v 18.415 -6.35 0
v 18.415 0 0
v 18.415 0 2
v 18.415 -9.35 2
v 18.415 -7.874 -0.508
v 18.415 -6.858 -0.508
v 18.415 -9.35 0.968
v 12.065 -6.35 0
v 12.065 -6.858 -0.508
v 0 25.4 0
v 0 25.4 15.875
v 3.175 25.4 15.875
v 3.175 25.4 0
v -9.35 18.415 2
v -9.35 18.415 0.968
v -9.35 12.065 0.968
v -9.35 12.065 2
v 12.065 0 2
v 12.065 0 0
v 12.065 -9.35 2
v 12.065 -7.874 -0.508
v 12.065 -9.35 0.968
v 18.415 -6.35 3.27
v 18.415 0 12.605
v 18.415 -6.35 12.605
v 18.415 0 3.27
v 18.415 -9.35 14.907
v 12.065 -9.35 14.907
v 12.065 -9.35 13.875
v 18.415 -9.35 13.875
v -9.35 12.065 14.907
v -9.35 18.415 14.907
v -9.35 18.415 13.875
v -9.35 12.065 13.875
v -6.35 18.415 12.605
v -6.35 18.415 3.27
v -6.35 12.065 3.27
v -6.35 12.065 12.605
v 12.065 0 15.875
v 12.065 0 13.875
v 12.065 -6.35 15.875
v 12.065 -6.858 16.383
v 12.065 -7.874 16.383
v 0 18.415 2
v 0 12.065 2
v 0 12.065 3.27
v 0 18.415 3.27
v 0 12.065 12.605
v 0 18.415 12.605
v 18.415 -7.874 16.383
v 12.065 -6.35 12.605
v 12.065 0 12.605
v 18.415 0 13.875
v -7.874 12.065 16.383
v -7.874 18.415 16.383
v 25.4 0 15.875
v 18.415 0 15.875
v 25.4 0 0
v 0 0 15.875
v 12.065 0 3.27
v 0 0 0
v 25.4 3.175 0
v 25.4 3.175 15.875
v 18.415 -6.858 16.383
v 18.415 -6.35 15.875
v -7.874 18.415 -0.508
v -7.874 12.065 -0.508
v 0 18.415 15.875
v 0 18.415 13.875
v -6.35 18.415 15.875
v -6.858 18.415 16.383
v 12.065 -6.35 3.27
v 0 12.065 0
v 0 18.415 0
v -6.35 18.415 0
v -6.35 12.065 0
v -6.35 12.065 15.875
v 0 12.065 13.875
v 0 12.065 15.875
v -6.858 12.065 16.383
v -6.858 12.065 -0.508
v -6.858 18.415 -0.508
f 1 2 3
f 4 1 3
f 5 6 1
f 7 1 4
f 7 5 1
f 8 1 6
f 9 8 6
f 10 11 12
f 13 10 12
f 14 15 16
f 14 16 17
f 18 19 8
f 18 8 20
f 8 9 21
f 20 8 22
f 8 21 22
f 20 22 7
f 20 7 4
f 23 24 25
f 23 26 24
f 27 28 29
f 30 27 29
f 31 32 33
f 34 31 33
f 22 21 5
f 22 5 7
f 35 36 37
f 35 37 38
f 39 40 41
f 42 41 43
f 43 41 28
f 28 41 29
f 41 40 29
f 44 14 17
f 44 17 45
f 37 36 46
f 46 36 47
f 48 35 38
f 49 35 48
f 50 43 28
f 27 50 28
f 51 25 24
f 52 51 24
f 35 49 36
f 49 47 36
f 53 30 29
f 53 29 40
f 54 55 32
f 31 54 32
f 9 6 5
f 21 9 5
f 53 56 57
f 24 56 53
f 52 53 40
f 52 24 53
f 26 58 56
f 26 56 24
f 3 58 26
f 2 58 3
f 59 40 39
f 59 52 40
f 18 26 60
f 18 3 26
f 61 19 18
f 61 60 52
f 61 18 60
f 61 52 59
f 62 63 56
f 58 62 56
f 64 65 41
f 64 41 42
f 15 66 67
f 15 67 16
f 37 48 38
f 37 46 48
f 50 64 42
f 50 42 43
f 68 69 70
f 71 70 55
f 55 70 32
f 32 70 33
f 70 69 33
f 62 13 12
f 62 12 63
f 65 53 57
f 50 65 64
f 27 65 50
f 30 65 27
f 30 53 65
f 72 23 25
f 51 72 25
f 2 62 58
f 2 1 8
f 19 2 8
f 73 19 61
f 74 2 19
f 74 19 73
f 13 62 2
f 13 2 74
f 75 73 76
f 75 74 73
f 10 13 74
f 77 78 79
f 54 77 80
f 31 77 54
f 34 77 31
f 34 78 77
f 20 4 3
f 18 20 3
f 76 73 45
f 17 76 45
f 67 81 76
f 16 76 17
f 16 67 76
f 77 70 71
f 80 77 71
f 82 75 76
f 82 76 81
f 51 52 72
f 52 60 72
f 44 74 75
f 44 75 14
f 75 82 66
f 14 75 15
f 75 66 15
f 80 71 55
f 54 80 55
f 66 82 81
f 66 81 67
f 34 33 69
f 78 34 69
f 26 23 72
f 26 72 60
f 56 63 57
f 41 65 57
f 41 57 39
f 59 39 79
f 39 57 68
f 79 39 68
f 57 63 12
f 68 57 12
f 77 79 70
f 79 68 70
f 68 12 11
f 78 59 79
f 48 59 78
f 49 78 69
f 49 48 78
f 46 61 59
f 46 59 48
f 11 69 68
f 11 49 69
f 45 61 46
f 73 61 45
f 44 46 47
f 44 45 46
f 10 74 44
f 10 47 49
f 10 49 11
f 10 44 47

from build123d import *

# Parameters (mm, degrees)
BOSS_EXTRUDE1_DEPTH = 15.875
SKETCH2_W           = 15.875
SKETCH2_H           = 6.35
BOSS_EXTRUDE2_DEPTH = 6.35
BOSS_EXTRUDE3_DEPTH = 6.35
SKETCH4_W           = 6.35
SKETCH4_H           = 1.27
CUT_EXTRUDE1_DEPTH  = 6.35


with BuildPart() as part:
    # Sketch1 → Boss-Extrude1 (new body)
    with BuildSketch(Plane.XY):
        Polygon((0, 0), (0, 25.4), (3.175, 25.4), (25.4, 3.175), (25.4, 0), align=None)
    extrude(amount=BOSS_EXTRUDE1_DEPTH)

    # Sketch2 → Boss-Extrude2 (add)
    with BuildSketch(Plane.ZY):
        with Locations((7.9375, 15.24)):
            Rectangle(SKETCH2_W, SKETCH2_H)
    boss_extrude2 = extrude(amount=BOSS_EXTRUDE2_DEPTH)

    # Sketch3 → Boss-Extrude3 (add)
    with BuildSketch(Plane(origin=(0, 18.415, 0), x_dir=(1, 0, 0), z_dir=(0, 1, 0))):
        Polygon((-9.35, -14.907), (-9.35, -13.875), (-6.35, -13.875), (-6.35, -15.875), (-6.858, -16.383), (-7.874, -16.383), align=None)
        Polygon((-7.874, 0.508), (-9.35, -0.968), (-9.35, -2), (-6.35, -2), (-6.35, 0), (-6.858, 0.508), align=None)
    boss_extrude3 = extrude(amount=-BOSS_EXTRUDE3_DEPTH)

    # Sketch4 → Cut-Extrude1 (cut)
    with BuildSketch(Plane(origin=(0, 18.415, 0), x_dir=(1, 0, 0), z_dir=(0, 1, 0))):
        with Locations((-3.175, -13.24)):
            Rectangle(SKETCH4_W, SKETCH4_H)
        with Locations((-3.175, -2.635)):
            Rectangle(SKETCH4_W, SKETCH4_H)
    cut_extrude1 = extrude(amount=-CUT_EXTRUDE1_DEPTH, mode=Mode.SUBTRACT)

    # Mirror1: Boss-Extrude2, Boss-Extrude3, Cut-Extrude1 across plane
    add(boss_extrude2.mirror(Plane(origin=(0, 0, 0), x_dir=(0, 0, 1), z_dir=(0.7071067811865476, -0.7071067811865476, 0))))
    add(boss_extrude3.mirror(Plane(origin=(0, 0, 0), x_dir=(0, 0, 1), z_dir=(0.7071067811865476, -0.7071067811865476, 0))))
    add(cut_extrude1.mirror(Plane(origin=(0, 0, 0), x_dir=(0, 0, 1), z_dir=(0.7071067811865476, -0.7071067811865476, 0))), mode=Mode.SUBTRACT)


solid = part.part
